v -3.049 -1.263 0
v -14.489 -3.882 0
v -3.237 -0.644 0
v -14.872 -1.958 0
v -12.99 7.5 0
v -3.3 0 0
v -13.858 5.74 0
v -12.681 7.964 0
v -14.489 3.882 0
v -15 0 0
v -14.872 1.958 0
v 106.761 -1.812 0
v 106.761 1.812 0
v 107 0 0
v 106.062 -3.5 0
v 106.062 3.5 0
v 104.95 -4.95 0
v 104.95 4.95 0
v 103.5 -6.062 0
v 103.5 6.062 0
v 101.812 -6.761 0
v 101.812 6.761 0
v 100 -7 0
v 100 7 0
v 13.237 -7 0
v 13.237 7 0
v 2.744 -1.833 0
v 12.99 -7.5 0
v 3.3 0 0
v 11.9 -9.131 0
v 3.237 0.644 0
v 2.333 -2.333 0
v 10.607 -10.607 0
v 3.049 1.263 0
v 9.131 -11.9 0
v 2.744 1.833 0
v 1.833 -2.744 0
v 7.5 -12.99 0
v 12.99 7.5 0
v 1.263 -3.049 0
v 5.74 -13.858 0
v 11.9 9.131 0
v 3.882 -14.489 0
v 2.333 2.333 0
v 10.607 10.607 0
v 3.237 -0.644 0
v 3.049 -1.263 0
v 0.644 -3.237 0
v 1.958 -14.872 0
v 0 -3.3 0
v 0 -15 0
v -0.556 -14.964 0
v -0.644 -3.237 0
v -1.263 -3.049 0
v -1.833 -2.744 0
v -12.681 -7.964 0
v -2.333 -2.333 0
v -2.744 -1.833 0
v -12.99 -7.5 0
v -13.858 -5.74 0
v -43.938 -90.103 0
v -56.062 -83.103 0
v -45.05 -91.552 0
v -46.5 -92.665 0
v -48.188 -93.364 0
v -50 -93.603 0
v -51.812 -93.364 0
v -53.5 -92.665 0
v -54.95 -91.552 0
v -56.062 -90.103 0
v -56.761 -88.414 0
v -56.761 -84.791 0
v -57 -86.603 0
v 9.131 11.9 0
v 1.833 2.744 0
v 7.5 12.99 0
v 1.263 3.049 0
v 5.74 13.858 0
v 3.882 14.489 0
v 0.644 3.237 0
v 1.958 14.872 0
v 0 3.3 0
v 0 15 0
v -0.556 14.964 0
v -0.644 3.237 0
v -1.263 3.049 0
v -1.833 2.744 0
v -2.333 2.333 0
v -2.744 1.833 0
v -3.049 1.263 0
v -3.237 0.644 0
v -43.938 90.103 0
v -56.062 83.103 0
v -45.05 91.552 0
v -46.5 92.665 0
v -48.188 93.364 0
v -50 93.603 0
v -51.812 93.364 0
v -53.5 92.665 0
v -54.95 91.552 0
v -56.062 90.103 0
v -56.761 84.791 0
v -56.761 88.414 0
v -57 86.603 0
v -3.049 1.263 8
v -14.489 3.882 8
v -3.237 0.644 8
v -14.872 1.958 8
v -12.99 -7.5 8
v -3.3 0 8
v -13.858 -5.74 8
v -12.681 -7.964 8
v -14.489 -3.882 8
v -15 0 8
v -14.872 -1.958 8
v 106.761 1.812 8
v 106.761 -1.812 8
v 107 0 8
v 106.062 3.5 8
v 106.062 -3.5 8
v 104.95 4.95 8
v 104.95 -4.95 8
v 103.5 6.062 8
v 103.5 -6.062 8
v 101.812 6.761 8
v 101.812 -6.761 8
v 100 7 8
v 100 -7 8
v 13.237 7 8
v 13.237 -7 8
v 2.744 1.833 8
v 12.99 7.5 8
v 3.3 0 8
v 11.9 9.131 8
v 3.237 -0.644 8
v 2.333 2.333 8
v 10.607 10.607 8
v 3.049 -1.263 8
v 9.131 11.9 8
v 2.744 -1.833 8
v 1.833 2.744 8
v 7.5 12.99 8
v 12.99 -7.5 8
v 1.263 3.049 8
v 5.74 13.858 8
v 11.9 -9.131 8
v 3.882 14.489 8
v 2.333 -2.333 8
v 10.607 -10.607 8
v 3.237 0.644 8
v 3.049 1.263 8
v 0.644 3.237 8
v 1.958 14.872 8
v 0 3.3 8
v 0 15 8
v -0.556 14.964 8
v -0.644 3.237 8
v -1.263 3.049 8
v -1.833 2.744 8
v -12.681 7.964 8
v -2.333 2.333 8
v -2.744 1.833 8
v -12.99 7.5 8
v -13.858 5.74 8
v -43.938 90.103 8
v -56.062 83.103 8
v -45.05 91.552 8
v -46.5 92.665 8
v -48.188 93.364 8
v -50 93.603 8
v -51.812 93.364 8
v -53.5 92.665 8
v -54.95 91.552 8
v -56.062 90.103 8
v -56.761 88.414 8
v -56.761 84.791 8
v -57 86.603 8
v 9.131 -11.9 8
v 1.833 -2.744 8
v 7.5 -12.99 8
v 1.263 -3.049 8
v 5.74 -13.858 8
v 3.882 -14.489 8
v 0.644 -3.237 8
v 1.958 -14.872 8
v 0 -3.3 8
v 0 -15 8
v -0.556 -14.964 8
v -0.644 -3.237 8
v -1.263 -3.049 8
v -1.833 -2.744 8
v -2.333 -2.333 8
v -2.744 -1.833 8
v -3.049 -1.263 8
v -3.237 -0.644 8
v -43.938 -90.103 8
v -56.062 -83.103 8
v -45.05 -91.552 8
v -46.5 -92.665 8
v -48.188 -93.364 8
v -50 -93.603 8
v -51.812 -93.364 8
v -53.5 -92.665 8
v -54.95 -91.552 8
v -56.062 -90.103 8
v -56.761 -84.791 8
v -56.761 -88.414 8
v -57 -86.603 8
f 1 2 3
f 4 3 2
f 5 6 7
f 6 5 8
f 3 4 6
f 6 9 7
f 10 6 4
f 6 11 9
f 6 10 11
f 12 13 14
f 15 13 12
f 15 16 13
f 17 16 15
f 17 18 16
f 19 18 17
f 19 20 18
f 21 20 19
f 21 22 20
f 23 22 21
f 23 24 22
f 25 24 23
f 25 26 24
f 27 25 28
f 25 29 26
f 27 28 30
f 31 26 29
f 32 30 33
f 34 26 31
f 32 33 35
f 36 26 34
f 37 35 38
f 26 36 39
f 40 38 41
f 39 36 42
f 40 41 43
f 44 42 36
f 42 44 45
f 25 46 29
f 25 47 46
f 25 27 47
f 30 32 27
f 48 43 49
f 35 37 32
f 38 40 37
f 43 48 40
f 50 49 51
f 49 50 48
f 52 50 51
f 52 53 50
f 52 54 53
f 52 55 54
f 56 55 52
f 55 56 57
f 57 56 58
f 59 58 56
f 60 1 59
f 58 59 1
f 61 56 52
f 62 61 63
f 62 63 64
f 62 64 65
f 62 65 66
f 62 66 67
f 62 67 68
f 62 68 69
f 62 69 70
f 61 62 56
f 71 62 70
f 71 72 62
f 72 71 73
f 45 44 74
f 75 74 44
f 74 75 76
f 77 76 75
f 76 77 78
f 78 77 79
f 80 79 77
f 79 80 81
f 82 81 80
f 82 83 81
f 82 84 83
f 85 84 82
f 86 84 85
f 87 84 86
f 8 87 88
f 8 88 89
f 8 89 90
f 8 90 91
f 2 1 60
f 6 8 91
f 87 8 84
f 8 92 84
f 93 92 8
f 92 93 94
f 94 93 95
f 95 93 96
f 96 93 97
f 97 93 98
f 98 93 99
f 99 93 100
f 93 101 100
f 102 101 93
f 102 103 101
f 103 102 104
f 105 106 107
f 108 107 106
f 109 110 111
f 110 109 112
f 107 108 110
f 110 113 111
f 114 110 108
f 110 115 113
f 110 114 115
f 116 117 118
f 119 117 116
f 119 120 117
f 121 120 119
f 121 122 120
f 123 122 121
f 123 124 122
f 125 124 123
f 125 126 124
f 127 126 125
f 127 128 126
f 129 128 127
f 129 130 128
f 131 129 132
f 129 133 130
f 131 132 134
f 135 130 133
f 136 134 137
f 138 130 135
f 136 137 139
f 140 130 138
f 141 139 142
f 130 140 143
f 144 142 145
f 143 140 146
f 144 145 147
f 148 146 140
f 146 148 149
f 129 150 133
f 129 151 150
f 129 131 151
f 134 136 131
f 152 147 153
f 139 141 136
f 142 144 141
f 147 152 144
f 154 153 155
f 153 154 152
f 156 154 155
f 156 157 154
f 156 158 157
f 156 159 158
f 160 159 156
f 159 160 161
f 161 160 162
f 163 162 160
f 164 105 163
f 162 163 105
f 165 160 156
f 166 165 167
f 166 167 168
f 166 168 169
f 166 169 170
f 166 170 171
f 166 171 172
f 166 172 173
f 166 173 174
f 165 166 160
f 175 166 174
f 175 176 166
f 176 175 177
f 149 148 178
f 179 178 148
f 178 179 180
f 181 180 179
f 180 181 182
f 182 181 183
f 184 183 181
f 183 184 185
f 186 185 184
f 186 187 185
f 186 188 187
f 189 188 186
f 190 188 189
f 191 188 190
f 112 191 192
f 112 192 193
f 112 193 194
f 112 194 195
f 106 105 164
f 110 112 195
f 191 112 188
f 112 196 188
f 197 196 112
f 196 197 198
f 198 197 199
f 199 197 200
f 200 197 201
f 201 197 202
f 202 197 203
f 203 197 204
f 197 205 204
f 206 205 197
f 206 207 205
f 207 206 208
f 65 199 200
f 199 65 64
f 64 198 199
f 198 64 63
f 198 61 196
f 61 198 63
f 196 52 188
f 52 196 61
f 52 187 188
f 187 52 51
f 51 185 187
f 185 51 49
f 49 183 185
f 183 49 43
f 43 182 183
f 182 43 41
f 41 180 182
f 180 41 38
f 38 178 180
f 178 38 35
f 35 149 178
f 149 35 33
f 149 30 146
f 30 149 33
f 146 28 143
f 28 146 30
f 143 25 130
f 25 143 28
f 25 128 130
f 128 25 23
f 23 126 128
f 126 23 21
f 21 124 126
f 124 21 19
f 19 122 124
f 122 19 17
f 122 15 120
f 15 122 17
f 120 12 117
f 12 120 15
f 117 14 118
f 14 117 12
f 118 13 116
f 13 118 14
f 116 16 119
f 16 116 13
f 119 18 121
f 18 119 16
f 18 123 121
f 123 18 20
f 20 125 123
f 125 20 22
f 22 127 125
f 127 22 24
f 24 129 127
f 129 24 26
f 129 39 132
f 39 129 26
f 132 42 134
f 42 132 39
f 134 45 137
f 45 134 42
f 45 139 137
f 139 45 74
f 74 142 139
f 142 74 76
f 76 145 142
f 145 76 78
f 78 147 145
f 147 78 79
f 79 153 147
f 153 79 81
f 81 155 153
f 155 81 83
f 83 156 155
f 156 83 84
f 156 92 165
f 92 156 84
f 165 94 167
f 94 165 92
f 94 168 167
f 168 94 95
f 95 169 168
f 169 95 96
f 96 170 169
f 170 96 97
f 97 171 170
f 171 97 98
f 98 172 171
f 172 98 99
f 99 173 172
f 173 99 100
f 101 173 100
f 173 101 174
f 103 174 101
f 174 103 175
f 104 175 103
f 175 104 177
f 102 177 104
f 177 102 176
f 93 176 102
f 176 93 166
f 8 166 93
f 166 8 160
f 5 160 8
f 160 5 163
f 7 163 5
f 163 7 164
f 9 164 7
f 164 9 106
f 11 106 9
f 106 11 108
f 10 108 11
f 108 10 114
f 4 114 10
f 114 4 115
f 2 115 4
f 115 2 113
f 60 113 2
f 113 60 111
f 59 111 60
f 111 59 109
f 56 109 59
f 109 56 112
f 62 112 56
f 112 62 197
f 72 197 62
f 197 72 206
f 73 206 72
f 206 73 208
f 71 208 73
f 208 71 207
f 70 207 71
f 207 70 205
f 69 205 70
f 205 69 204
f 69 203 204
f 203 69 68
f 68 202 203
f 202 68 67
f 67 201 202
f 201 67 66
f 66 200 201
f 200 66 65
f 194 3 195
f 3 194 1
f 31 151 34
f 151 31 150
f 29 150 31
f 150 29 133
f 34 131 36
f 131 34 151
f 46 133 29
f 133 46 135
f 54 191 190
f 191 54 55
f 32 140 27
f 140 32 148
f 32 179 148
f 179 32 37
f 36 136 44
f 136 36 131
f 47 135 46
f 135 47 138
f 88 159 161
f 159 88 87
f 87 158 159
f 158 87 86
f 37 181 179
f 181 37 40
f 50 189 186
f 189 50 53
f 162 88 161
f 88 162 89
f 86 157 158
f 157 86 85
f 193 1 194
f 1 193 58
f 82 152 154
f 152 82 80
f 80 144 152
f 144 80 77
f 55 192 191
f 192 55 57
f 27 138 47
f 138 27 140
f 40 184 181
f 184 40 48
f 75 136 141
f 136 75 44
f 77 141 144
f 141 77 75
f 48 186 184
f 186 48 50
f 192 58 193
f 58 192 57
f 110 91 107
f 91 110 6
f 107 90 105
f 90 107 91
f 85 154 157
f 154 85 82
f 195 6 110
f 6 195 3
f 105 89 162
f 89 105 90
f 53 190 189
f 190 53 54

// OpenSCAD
arm_radius=100; arm_width=14; rotor_thickness=8; hub_diameter=30; axle_bore=6.6;
module carousel_rotor(){ difference(){ linear_extrude(height=rotor_thickness) union(){ circle(d=hub_diameter,$fn=48); for(a=[0,120,240]) rotate(a) hull(){ circle(d=arm_width,$fn=24); translate([arm_radius,0]) circle(d=arm_width,$fn=24); } } translate([0,0,-1]) cylinder(d=axle_bore,h=rotor_thickness+2,$fn=32); }}
assert(arm_radius==100 && axle_bore==6.6); echo("SCADCTL_REQUIREMENT:parameters:PASS"); carousel_rotor();
